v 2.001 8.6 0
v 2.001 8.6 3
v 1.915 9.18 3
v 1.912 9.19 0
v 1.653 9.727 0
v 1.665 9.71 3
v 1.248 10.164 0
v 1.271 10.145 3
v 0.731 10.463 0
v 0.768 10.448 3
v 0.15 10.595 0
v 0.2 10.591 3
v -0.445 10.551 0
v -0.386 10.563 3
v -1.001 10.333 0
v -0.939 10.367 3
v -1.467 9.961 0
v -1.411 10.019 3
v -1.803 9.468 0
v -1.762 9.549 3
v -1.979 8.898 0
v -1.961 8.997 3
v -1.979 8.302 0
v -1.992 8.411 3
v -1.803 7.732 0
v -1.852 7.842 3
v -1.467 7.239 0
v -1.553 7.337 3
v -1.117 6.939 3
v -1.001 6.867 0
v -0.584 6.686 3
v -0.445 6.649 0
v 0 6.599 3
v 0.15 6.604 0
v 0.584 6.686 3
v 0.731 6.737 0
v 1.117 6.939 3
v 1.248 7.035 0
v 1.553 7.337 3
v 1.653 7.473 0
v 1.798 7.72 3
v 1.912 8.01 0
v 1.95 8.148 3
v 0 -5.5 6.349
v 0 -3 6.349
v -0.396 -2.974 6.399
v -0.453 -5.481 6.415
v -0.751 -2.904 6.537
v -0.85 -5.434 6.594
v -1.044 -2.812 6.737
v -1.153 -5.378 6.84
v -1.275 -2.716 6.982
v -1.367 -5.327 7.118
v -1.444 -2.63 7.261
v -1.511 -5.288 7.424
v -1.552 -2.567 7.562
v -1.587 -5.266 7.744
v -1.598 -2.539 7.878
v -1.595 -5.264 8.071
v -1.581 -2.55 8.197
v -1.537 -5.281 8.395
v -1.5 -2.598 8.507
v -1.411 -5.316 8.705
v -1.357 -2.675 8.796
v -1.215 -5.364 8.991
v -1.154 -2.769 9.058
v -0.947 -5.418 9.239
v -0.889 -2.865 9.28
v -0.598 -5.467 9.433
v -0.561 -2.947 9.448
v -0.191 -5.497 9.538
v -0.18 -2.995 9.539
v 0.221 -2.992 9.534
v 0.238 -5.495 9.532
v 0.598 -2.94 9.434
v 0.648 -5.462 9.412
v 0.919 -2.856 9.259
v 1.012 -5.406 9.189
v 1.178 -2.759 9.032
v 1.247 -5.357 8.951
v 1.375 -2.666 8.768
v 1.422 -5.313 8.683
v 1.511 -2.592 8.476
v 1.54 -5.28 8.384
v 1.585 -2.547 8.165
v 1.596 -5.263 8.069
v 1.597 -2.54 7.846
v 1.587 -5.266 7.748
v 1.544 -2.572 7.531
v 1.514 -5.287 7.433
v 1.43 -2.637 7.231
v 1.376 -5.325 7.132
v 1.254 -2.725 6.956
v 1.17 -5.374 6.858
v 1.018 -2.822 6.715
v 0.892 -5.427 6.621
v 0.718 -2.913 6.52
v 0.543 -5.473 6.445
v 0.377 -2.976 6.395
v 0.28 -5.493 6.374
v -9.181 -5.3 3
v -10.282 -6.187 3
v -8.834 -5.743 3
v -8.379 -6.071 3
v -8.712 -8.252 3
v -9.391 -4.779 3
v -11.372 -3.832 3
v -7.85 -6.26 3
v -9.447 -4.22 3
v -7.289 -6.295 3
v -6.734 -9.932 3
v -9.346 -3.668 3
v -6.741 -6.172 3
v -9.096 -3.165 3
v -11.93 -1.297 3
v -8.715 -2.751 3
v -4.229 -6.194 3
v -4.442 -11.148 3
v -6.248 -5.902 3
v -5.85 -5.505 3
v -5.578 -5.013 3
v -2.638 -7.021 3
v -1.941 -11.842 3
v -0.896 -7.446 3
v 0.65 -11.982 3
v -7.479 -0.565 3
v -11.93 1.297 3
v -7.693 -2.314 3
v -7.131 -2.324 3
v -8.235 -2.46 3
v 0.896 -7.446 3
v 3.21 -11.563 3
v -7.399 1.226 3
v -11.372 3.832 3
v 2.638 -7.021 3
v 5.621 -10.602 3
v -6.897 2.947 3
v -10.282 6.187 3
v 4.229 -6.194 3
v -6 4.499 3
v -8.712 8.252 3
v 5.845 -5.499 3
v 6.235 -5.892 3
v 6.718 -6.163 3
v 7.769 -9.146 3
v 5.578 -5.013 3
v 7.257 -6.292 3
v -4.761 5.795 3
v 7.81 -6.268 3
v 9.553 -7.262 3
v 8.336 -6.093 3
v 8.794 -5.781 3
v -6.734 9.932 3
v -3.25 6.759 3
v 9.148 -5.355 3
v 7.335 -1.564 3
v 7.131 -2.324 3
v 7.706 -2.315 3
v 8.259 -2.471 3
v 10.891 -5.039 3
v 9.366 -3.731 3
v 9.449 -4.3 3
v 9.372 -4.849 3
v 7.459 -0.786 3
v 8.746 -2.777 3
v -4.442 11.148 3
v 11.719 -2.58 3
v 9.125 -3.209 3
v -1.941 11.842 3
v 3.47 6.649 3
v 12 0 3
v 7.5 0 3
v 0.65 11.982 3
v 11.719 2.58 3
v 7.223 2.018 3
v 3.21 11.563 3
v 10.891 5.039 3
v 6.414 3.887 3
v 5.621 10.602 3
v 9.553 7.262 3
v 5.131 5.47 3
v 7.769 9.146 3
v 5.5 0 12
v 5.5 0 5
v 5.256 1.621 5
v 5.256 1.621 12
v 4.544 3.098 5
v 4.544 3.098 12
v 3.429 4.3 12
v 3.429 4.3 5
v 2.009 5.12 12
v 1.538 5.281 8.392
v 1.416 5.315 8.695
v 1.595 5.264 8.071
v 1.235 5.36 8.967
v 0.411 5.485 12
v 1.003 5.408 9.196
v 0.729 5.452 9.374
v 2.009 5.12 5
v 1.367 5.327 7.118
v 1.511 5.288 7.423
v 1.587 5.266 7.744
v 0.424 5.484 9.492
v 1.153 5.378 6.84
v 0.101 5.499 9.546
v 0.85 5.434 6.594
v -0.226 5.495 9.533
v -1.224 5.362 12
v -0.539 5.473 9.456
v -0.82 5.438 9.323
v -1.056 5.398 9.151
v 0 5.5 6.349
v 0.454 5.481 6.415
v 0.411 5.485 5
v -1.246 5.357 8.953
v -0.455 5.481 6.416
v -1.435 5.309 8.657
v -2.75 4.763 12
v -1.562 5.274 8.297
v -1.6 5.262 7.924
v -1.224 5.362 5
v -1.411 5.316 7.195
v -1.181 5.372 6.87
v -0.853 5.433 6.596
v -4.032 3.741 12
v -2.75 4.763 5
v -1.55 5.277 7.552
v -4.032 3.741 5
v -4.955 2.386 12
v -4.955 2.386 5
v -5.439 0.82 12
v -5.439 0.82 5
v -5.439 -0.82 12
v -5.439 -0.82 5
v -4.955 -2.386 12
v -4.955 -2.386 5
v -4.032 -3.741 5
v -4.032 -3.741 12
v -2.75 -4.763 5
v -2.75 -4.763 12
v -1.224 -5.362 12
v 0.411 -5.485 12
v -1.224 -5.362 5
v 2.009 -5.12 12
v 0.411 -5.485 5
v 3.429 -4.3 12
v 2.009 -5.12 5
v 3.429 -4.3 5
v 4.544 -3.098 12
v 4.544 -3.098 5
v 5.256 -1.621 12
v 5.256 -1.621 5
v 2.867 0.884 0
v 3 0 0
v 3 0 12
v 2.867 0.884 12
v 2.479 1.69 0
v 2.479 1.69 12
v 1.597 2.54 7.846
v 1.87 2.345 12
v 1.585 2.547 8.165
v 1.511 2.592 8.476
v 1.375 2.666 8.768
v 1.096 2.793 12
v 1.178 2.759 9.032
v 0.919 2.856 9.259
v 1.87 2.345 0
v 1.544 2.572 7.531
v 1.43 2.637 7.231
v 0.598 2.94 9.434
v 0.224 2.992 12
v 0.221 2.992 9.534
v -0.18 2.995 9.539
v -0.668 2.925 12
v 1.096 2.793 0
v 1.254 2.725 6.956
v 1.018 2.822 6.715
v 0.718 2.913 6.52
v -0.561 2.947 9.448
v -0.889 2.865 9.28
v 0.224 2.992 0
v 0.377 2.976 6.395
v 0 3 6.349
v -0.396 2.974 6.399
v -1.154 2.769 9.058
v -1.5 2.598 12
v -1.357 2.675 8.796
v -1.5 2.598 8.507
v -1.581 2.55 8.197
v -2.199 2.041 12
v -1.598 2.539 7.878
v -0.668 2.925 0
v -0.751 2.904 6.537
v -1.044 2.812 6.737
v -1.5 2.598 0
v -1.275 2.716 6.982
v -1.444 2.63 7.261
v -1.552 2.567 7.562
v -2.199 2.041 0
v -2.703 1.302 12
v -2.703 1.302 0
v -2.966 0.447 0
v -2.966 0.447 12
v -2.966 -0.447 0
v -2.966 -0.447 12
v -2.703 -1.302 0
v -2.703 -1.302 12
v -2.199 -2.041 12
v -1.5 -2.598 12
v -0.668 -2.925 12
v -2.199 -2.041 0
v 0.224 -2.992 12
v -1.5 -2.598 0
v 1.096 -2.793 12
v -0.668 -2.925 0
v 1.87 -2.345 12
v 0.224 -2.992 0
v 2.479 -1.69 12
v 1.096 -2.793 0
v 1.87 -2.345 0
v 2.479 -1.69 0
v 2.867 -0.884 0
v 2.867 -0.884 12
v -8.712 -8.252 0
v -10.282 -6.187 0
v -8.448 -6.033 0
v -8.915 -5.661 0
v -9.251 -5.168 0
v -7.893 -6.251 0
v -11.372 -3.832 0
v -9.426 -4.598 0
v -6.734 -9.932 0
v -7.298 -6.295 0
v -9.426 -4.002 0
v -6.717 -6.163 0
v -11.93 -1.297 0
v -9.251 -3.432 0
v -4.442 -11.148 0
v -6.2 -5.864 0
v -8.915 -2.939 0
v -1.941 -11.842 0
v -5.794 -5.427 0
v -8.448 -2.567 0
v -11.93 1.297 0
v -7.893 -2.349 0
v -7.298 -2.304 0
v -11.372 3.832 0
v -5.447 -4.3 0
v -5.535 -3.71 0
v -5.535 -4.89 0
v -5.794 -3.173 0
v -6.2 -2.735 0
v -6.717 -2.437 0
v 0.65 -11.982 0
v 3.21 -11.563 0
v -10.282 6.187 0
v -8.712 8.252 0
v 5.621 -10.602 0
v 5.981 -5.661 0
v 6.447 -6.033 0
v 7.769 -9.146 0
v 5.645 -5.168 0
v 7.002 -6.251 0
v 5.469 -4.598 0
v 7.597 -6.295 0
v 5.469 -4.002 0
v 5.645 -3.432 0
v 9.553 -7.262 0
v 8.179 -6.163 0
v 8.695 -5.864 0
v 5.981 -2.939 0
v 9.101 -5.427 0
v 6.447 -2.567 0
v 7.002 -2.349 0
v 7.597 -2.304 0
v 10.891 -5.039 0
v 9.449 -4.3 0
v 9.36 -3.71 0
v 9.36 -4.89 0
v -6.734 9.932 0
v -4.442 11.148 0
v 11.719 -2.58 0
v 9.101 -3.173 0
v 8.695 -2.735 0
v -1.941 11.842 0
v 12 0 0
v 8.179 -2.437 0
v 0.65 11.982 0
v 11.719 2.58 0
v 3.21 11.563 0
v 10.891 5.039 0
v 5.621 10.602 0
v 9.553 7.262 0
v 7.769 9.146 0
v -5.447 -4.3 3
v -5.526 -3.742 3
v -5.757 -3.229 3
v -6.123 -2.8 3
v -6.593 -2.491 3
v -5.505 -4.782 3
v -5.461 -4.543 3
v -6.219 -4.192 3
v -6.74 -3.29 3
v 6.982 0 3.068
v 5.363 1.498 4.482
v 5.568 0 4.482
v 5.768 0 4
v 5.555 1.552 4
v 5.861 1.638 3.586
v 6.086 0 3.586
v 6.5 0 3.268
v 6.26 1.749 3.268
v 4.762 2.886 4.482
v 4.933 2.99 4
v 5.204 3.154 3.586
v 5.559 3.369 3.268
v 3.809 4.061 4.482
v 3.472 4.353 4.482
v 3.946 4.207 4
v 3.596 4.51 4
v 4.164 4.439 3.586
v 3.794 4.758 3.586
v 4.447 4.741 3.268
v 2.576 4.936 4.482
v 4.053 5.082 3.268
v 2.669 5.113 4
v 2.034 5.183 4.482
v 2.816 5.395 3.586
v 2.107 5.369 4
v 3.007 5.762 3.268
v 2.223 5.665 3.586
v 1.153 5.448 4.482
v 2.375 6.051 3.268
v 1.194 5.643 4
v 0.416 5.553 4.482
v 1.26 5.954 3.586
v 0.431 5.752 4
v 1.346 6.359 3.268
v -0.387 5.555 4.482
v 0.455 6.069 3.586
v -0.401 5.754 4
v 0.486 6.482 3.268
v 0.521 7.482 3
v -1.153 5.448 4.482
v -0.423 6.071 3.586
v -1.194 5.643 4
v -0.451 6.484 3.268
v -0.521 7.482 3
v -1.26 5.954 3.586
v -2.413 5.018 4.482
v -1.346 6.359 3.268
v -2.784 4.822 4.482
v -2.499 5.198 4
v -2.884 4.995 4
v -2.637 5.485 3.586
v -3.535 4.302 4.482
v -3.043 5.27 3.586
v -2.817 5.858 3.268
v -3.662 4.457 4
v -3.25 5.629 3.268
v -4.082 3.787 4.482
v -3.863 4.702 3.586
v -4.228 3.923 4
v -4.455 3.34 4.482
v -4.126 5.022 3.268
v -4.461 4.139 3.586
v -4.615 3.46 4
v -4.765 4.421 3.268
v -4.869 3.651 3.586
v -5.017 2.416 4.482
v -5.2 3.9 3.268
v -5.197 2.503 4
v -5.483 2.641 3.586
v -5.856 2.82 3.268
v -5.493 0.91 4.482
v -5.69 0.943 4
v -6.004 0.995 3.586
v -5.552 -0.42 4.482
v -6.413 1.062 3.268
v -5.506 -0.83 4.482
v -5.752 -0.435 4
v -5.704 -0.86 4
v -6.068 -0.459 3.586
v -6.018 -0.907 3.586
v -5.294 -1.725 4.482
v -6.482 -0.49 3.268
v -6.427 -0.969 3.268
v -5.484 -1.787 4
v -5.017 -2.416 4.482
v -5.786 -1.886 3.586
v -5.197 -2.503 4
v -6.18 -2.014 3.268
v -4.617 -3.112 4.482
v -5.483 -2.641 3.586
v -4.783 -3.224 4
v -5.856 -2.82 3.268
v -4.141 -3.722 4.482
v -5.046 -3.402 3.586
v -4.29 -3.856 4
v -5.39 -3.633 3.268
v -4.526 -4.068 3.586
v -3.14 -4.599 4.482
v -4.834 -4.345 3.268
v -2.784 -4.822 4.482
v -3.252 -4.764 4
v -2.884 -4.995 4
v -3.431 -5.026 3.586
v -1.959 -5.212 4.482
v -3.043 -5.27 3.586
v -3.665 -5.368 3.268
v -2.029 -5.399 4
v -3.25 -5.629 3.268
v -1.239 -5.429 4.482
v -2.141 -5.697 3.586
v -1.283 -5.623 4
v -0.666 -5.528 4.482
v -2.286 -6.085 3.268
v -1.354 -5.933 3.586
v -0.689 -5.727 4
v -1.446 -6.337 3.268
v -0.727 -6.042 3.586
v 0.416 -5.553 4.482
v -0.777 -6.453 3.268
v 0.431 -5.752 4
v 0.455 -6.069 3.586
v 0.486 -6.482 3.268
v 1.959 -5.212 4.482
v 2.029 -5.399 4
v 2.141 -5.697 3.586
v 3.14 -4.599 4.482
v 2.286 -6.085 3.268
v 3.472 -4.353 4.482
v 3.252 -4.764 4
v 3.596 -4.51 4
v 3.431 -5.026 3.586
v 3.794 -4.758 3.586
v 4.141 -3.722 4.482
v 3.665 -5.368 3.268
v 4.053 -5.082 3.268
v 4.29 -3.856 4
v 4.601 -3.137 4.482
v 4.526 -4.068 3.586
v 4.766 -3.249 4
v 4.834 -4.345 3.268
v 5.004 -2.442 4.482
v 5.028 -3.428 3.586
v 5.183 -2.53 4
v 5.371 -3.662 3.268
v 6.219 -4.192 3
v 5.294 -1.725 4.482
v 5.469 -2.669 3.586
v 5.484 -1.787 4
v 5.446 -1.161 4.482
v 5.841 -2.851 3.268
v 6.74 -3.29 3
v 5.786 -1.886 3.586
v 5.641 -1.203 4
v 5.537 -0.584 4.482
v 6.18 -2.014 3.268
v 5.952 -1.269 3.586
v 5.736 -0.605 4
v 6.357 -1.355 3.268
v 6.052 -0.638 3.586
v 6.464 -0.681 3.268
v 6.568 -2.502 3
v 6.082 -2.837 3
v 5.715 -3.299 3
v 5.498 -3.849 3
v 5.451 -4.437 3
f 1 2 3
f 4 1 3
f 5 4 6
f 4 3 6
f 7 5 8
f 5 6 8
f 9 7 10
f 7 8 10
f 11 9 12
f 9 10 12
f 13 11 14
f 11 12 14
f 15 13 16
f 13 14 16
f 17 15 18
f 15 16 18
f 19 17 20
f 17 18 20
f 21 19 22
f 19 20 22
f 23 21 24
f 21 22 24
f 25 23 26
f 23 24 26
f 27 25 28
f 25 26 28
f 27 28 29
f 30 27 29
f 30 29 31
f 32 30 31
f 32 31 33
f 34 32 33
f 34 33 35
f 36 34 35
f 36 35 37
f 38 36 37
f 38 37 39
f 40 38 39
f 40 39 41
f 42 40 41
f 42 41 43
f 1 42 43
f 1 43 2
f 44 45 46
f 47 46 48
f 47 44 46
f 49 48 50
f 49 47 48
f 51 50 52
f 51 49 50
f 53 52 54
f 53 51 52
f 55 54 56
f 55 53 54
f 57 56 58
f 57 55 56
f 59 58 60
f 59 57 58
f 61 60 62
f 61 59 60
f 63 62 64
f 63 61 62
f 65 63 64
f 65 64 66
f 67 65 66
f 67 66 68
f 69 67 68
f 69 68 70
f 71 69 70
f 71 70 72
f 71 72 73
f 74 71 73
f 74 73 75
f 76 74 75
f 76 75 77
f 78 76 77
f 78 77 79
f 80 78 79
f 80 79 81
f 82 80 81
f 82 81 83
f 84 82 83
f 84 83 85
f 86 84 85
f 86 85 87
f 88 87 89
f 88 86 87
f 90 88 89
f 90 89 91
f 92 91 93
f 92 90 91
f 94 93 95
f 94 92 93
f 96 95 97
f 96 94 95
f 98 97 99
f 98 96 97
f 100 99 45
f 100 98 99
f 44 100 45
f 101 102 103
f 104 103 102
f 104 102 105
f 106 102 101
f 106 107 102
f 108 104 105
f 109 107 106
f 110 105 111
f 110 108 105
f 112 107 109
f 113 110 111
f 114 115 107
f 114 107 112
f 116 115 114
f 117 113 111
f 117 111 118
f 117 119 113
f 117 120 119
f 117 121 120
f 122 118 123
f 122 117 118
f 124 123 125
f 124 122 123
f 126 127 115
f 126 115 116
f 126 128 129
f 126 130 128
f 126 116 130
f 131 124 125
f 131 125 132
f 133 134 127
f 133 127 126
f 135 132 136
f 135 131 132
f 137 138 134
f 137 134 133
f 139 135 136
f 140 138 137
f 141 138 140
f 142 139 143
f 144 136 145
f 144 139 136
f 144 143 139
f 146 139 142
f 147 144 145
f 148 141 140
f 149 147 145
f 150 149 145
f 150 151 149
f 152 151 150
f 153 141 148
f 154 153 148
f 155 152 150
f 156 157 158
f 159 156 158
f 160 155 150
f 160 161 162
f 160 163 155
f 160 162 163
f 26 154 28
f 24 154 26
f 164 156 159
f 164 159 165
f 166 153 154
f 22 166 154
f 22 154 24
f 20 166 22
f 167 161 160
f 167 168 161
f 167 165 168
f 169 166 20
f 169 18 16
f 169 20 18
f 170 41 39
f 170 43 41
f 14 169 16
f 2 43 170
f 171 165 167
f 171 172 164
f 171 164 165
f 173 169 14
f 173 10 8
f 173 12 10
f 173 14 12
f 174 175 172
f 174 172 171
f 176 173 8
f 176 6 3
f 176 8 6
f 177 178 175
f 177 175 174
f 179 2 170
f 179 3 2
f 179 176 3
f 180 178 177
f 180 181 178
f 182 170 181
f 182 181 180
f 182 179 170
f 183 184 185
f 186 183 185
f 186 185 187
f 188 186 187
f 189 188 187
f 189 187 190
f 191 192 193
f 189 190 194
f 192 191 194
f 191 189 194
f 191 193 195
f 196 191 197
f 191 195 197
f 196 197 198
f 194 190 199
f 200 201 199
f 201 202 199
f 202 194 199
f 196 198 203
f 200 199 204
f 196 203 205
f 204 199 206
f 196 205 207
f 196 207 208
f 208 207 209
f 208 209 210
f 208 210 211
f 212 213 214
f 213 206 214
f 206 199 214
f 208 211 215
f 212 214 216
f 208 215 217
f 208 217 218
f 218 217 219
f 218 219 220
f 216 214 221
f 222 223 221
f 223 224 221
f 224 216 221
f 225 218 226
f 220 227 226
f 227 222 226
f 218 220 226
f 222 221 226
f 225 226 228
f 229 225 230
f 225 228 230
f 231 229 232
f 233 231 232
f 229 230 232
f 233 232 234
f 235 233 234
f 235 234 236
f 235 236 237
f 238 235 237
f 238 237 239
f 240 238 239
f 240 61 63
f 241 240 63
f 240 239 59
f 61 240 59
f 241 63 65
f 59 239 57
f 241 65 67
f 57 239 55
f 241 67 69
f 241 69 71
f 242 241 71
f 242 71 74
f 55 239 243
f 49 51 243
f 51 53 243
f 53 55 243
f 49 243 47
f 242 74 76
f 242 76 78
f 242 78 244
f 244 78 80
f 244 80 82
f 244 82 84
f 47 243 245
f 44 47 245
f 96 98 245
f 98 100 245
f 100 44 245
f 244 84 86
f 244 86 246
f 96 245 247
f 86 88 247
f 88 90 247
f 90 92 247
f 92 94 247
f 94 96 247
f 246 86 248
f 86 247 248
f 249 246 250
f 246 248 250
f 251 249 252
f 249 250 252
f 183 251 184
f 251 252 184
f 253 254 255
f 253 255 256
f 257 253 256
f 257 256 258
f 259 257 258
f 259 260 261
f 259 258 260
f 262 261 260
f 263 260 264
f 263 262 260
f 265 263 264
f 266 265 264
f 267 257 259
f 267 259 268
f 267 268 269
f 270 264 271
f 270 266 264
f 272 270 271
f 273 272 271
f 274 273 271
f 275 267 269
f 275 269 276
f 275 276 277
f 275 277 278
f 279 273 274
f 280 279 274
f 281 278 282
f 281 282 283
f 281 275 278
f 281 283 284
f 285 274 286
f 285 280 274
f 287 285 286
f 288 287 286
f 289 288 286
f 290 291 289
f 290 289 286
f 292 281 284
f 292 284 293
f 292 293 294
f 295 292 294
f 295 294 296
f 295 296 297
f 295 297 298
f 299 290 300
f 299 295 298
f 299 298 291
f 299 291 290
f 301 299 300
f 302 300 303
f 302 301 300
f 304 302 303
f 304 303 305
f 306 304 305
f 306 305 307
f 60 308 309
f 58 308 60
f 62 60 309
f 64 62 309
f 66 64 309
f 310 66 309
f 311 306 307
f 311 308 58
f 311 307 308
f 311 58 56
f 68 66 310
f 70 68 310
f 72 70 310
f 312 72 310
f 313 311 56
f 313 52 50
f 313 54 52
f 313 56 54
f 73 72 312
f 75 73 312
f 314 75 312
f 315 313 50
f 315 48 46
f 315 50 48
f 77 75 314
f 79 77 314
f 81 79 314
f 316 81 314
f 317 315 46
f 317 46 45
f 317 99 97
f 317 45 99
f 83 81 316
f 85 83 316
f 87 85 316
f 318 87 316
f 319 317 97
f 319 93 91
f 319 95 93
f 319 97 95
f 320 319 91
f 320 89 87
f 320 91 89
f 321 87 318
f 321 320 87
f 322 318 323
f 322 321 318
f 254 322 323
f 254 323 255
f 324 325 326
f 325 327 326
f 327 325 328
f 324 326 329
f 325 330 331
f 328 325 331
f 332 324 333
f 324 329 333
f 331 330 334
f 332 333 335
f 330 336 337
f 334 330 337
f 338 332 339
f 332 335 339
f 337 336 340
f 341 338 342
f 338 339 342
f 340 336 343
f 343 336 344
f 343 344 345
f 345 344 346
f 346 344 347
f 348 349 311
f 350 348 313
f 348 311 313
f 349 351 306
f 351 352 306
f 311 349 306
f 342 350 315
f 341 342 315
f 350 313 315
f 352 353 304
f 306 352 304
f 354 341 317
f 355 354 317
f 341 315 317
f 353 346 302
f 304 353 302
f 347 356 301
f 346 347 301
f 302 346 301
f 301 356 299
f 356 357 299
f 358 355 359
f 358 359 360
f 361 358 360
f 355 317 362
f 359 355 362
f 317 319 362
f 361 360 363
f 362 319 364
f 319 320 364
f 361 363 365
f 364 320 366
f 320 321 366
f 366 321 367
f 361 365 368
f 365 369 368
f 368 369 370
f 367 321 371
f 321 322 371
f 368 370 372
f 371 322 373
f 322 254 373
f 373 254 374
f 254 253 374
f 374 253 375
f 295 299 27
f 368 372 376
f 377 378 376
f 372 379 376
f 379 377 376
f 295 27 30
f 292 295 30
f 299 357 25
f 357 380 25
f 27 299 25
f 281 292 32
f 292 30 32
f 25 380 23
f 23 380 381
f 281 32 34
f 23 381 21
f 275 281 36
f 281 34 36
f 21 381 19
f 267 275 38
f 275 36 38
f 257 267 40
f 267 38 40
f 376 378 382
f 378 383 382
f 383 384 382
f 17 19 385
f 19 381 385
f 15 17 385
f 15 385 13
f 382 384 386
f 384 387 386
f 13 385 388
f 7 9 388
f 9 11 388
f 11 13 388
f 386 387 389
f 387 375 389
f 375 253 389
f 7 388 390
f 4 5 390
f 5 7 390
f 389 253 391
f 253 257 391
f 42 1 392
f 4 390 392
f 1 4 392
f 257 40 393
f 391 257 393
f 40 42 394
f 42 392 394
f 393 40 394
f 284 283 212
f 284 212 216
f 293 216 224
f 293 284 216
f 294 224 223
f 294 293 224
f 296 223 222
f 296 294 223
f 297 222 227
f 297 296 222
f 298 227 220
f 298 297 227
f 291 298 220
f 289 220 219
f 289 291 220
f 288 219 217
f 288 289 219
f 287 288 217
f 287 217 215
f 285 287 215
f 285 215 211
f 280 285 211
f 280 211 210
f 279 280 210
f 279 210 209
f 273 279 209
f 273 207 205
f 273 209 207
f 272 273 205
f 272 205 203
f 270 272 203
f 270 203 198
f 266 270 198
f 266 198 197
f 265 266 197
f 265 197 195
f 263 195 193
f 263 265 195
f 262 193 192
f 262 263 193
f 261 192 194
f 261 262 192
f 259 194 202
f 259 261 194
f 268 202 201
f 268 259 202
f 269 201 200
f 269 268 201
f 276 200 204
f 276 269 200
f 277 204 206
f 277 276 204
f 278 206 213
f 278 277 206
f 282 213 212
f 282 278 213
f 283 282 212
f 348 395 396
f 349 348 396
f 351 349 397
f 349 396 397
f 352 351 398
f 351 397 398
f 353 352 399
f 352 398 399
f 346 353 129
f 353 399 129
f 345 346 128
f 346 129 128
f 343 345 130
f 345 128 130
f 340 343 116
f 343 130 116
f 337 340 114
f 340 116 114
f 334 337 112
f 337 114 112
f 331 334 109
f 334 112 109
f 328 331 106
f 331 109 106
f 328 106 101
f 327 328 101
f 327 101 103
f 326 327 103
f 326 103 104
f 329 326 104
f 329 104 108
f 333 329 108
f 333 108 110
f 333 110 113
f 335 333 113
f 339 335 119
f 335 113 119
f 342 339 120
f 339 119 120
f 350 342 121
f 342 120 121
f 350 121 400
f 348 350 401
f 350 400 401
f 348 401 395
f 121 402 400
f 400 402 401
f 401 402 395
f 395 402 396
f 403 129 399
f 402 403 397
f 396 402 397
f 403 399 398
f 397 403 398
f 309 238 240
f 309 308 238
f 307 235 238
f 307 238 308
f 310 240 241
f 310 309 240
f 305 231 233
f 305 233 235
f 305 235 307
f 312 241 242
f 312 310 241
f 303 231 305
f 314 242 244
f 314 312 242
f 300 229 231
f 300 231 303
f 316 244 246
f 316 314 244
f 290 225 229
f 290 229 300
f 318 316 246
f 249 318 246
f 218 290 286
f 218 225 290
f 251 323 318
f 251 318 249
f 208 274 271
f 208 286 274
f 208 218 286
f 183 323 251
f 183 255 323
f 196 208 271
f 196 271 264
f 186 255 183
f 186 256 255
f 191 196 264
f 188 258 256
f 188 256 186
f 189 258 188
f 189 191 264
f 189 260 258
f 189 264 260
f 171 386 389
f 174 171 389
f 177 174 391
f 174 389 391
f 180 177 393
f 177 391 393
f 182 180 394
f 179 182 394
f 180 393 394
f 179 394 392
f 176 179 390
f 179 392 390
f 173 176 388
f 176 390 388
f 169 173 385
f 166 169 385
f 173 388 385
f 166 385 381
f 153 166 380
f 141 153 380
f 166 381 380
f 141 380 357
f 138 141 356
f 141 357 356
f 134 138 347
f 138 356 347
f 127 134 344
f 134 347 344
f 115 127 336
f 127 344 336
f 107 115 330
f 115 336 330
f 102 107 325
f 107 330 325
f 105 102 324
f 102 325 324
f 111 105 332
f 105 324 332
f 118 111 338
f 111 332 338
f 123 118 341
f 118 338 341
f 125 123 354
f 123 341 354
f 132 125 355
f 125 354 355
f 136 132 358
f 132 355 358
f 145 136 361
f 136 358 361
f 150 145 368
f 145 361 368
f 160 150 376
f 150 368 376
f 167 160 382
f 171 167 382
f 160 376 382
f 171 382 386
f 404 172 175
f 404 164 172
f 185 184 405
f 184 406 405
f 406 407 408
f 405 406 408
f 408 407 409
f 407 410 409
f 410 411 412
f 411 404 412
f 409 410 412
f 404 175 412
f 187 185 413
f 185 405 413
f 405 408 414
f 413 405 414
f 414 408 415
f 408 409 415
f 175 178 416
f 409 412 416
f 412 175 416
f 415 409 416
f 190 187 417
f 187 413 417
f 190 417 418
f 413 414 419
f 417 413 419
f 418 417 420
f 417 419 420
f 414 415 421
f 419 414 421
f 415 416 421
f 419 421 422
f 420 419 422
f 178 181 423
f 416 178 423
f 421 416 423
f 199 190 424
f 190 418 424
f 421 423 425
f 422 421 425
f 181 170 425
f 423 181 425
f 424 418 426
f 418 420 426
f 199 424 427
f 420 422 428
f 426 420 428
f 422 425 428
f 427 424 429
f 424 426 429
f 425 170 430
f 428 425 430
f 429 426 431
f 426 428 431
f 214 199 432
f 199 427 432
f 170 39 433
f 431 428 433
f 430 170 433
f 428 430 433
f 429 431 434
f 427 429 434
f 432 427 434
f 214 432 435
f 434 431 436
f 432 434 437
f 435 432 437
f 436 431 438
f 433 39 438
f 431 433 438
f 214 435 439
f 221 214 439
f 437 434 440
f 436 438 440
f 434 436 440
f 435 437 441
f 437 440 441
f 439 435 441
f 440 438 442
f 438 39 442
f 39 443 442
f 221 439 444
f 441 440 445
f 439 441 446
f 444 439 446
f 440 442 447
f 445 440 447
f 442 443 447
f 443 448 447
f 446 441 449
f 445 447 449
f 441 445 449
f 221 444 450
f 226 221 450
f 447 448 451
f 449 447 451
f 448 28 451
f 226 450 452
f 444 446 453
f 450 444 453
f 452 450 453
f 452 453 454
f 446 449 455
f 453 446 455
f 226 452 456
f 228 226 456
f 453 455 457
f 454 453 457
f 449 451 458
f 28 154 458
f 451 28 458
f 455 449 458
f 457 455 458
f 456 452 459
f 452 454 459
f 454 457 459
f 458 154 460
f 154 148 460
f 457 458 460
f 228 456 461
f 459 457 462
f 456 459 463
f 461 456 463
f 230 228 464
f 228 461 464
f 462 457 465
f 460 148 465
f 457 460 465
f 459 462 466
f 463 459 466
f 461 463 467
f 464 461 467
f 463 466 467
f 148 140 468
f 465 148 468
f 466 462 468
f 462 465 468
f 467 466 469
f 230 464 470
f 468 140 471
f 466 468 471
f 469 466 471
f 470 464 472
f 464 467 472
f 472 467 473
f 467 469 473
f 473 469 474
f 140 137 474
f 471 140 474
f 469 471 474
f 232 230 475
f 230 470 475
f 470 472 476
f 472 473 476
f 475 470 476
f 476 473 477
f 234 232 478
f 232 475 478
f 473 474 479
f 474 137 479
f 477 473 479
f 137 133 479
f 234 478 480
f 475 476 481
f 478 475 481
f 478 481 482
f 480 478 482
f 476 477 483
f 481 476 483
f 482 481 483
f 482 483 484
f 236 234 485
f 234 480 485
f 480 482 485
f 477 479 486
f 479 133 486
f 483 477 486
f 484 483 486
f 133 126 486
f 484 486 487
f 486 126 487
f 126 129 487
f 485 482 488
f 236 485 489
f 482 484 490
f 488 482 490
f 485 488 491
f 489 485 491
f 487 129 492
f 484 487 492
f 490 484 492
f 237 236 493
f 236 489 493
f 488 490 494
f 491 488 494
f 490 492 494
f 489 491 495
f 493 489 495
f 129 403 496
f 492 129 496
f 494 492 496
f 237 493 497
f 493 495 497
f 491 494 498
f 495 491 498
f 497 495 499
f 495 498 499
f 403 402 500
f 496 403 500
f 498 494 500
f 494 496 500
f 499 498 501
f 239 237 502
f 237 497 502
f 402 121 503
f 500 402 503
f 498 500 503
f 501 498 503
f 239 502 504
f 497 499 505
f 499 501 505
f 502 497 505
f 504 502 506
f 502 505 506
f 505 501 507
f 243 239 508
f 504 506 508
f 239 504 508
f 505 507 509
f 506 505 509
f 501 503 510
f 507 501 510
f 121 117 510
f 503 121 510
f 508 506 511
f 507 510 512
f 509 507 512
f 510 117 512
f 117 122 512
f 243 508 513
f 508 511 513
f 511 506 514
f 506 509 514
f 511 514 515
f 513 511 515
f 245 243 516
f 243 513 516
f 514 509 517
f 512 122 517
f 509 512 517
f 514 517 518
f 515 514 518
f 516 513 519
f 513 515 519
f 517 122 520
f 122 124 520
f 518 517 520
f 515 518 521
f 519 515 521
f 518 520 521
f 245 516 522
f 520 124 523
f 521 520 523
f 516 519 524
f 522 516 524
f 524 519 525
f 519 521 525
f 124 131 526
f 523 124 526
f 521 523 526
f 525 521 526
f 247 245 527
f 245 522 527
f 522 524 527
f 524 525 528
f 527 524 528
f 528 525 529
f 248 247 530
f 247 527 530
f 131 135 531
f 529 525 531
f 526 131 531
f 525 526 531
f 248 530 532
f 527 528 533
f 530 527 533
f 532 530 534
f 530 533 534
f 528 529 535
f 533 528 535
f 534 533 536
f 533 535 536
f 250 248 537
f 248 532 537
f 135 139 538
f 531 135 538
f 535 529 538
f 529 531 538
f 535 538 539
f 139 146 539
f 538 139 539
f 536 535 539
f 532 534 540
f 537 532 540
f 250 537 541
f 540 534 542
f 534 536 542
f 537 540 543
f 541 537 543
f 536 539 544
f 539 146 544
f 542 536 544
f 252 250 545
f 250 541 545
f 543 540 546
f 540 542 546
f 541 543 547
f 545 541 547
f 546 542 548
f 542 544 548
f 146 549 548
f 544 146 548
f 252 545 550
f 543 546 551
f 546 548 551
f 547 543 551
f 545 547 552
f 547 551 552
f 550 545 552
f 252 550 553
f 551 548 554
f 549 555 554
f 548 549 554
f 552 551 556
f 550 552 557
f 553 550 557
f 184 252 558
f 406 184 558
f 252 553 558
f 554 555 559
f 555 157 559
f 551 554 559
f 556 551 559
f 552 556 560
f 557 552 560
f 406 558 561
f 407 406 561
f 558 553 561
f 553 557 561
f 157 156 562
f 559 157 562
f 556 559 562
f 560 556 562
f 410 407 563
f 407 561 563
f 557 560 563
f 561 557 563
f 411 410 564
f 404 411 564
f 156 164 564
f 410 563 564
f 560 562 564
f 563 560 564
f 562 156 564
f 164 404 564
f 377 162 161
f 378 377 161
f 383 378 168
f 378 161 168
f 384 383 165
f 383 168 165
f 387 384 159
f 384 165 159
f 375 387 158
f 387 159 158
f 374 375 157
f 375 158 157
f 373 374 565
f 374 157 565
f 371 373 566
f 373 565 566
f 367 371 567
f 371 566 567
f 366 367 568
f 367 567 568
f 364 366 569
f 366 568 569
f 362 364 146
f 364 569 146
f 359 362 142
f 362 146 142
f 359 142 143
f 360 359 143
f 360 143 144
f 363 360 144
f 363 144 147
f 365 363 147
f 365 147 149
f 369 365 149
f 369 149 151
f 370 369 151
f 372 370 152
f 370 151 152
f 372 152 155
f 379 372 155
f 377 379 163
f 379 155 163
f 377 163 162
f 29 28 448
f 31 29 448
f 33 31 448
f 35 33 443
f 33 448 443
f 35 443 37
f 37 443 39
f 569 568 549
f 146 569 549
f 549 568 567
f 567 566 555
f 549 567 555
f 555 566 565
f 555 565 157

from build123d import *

# Parameters (mm, degrees)
SKETCH1_R           = 12
SKETCH1_R_2         = 5.5
BOSS_EXTRUDE1_DEPTH = 3
SKETCH1_5_R         = 5.5
SKETCH1_5_R_2       = 3
BOSS_EXTRUDE3_DEPTH = 12
FILLET2_R           = 2
CUT_EXTRUDE1_START  = -5.5
SKETCH2_R           = 1.6
CUT_EXTRUDE1_DEPTH  = 11
SKETCH3_R           = 2.001151749
CUT_EXTRUDE2_DEPTH  = 4


with BuildPart() as part:
    # Sketch1 → Boss-Extrude1 (new body)
    with BuildSketch(Plane.XY):
        Circle(SKETCH1_R)
        Circle(SKETCH1_R_2, mode=Mode.SUBTRACT)
    extrude(amount=BOSS_EXTRUDE1_DEPTH)

    # Sketch1<5> → Boss-Extrude3 (add)
    with BuildSketch(Plane.XY):
        Circle(SKETCH1_5_R)
        Circle(SKETCH1_5_R_2, mode=Mode.SUBTRACT)
    extrude(amount=BOSS_EXTRUDE3_DEPTH)

    # Fillet2
    fillet2_edges = [part.edges().sort_by_distance(p)[0] for p in [
        (-5.5, 0, 3),
    ]]
    fillet(fillet2_edges, radius=FILLET2_R)

    # Sketch2 → Cut-Extrude1 (cut)
    with BuildSketch(Plane(origin=(0, 0, 0), x_dir=(1, 0, 0), z_dir=(0, 1, 0)).offset(CUT_EXTRUDE1_START)):
        with Locations(Location((0, -7.949486667, 0), (0, 0, 90))):
            Circle(SKETCH2_R)
    extrude(amount=CUT_EXTRUDE1_DEPTH, mode=Mode.SUBTRACT)

    # Sketch3 → Cut-Extrude2 (cut)
    with BuildSketch(Plane.XY.offset(3)):
        with Locations((0, 8.599839423)):
            Circle(SKETCH3_R)
        with Locations((7.447679409, -4.299919712)):
            Circle(SKETCH3_R)
        with Locations((-7.447679409, -4.299919712)):
            Circle(SKETCH3_R)
    extrude(amount=-CUT_EXTRUDE2_DEPTH, mode=Mode.SUBTRACT)


solid = part.part
